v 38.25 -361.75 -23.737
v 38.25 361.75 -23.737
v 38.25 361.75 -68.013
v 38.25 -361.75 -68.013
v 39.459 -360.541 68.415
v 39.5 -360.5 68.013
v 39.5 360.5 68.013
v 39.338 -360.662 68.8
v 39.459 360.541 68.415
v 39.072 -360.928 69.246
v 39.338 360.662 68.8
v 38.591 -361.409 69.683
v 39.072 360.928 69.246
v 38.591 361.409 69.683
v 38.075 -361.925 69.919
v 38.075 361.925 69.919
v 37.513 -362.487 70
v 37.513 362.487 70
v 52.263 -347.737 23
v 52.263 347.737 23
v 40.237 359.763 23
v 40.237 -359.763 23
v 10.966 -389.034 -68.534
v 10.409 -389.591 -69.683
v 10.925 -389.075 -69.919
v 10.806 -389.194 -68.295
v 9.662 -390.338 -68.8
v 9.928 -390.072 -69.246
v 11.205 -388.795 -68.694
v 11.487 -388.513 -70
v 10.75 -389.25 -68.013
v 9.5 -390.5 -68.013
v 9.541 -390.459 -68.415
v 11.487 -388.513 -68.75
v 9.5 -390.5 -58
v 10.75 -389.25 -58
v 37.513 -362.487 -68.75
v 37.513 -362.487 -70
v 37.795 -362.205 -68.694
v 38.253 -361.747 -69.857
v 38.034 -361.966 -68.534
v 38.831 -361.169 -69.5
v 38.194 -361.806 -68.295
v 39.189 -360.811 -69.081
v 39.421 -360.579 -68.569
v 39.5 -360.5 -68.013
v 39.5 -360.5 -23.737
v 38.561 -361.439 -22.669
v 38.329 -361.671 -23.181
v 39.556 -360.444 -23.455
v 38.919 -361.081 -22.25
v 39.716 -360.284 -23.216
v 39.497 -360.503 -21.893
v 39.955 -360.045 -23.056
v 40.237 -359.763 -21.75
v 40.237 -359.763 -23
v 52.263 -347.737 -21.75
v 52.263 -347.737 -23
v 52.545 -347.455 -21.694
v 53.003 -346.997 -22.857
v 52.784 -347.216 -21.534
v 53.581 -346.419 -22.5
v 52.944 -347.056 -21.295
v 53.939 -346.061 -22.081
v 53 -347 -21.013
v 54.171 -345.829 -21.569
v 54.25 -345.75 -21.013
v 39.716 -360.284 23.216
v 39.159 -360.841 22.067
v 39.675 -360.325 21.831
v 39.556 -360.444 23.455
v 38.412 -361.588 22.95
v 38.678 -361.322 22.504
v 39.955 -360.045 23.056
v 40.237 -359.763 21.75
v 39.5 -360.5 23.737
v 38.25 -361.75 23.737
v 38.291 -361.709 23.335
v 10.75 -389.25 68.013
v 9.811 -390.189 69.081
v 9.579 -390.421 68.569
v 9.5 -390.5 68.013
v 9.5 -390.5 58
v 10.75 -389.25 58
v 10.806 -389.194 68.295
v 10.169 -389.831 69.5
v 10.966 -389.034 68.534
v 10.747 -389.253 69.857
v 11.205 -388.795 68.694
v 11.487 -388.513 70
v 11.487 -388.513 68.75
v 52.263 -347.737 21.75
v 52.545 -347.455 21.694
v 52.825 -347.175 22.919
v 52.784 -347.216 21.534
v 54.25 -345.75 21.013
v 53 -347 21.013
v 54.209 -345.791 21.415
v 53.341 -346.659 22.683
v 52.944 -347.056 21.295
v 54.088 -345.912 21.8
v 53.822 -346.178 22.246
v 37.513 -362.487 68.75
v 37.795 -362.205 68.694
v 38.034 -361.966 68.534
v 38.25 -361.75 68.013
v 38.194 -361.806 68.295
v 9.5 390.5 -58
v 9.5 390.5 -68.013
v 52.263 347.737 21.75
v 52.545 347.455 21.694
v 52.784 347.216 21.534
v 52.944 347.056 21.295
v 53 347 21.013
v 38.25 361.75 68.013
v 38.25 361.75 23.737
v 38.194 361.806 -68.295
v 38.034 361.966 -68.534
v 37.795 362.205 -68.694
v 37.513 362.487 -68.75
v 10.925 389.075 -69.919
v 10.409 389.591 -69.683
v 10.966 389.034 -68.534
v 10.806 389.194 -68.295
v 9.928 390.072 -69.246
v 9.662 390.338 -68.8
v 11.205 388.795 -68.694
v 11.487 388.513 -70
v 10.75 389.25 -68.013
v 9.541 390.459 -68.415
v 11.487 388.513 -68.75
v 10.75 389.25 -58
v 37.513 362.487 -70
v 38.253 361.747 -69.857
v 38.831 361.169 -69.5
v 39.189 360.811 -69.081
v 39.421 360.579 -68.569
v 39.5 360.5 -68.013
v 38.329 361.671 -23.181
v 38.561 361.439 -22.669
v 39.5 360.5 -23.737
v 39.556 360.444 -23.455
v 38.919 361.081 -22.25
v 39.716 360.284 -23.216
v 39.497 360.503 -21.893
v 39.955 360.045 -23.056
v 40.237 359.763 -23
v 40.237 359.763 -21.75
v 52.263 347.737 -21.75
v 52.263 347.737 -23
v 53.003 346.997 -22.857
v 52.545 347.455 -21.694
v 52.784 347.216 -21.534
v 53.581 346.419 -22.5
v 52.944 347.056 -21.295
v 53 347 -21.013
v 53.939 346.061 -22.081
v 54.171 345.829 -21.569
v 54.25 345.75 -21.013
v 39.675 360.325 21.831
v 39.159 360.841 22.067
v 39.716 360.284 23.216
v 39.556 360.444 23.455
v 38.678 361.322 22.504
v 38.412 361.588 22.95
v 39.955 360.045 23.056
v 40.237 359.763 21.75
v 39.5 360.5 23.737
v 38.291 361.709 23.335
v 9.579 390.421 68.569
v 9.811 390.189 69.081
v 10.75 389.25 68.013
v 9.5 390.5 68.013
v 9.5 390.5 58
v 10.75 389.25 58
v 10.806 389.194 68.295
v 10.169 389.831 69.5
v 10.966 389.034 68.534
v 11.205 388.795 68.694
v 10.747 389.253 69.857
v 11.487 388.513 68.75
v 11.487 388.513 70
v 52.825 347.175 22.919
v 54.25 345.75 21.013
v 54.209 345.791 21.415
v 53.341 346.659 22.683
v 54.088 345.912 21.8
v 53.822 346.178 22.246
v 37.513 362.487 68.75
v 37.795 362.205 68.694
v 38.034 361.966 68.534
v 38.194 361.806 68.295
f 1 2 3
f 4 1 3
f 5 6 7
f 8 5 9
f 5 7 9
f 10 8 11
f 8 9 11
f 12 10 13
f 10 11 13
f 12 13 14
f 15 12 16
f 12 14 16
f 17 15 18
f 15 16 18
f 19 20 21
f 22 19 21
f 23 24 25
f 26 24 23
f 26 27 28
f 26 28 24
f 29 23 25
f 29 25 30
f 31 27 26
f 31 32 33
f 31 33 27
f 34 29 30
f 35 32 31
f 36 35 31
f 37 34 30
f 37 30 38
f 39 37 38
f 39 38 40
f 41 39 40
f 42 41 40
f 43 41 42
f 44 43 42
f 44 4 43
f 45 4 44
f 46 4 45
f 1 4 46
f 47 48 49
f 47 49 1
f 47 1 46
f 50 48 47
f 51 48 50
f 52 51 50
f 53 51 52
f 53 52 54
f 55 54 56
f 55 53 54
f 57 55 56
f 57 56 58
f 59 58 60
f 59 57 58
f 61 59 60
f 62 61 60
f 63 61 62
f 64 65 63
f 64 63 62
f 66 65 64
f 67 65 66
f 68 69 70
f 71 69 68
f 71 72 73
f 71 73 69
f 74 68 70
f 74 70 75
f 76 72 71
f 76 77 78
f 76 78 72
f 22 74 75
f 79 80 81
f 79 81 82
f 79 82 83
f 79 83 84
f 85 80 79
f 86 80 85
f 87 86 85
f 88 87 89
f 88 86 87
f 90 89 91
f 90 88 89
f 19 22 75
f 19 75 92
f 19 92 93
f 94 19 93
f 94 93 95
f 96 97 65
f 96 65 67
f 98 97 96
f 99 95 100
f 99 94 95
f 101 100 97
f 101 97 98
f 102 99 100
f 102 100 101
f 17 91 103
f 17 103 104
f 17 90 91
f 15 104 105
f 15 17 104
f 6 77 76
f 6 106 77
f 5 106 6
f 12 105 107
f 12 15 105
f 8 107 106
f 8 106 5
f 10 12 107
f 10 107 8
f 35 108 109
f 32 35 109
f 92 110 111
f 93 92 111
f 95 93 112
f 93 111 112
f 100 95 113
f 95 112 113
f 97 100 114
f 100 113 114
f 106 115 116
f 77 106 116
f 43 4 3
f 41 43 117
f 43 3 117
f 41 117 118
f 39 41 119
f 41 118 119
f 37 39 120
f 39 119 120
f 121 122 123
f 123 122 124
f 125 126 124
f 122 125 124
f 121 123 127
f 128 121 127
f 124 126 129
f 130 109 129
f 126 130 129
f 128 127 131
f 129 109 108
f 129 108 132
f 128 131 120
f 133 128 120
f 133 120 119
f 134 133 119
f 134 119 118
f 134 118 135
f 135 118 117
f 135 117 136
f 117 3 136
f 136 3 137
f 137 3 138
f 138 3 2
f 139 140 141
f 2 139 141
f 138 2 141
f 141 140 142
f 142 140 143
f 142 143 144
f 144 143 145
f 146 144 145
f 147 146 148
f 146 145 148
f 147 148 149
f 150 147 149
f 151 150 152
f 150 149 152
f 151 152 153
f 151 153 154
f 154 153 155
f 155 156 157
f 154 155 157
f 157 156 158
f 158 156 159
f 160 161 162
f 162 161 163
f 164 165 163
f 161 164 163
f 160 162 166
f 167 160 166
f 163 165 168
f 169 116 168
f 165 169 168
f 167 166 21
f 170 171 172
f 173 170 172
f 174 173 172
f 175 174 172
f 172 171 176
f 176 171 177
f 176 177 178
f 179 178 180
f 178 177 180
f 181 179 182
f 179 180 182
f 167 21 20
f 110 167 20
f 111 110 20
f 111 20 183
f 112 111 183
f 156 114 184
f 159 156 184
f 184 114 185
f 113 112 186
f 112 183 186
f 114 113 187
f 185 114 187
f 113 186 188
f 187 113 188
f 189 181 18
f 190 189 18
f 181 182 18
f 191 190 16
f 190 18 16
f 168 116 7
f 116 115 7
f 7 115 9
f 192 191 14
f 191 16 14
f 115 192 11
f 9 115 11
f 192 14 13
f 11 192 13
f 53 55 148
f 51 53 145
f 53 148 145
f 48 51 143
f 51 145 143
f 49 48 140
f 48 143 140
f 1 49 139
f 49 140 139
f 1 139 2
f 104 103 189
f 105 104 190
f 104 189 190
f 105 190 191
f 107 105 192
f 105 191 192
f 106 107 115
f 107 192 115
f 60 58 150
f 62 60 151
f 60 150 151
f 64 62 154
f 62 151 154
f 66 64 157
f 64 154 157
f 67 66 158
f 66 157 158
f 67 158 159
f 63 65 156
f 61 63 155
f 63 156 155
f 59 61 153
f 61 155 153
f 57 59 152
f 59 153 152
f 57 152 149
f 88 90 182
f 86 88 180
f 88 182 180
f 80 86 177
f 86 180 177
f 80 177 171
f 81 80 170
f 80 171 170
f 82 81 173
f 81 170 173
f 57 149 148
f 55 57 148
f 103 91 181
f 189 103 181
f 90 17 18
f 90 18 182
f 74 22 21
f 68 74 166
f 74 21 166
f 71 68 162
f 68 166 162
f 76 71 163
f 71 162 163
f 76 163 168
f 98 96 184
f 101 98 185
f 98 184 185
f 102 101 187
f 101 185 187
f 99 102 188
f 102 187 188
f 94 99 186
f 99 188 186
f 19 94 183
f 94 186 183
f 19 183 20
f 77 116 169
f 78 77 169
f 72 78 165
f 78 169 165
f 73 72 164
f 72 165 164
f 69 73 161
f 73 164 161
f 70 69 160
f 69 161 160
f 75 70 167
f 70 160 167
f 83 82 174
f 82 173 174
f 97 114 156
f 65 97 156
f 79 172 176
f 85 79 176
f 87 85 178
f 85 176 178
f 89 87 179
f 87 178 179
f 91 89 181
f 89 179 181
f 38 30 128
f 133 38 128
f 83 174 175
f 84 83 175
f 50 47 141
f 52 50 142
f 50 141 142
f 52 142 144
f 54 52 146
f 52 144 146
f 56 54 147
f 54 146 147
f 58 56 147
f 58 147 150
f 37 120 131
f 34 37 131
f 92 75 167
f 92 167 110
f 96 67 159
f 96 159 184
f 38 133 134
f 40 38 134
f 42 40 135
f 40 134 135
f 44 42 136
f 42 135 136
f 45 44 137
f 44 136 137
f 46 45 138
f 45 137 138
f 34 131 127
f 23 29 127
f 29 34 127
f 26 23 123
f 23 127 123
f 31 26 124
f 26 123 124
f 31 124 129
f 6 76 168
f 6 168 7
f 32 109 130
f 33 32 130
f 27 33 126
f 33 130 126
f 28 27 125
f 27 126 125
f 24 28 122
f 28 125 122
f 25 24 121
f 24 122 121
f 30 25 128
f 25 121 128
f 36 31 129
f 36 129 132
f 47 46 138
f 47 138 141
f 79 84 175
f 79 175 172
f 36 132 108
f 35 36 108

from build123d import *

# Parameters (mm, degrees)
BASE_FLANGE1_DEPTH = 390.5
CUT_EXTRUDE2_DEPTH = 419.369827425


# Sheet-metal steps are written as plain solids
with BuildPart() as part:
    # Sketch1 → Base-Flange1 (new, symmetric)
    with BuildSketch(Plane(origin=(0, 0, 0), x_dir=(1, 0, 0), z_dir=(0, 1, 0))):
        with BuildLine():
            Line((9.5, 58), (9.5, 68.0134))
            ThreePointArc((9.5, 68.0134), (10.081861668, 69.418138332), (11.4866, 70))
            Line((11.4866, 70), (37.5134, 70))
            ThreePointArc((37.5134, 70), (38.918138332, 69.418138332), (39.5, 68.0134))
            Line((39.5, 68.0134), (39.5, 23.7366))
            ThreePointArc((39.5, 23.7366), (39.715745145, 23.215745145), (40.2366, 23))
            Line((40.2366, 23), (52.2634, 23))
            ThreePointArc((52.2634, 23), (53.668138332, 22.418138332), (54.25, 21.0134))
            Line((54.25, 21.0134), (54.25, 18))
            Line((54.25, 18), (54.25, -21.0134))
            ThreePointArc((54.25, -21.0134), (53.668138332, -22.418138332), (52.2634, -23))
            Line((52.2634, -23), (40.2366, -23))
            ThreePointArc((40.2366, -23), (39.715745145, -23.215745145), (39.5, -23.7366))
            Line((39.5, -23.7366), (39.5, -68.0134))
            ThreePointArc((39.5, -68.0134), (38.918138332, -69.418138332), (37.5134, -70))
            Line((37.5134, -70), (11.4866, -70))
            ThreePointArc((11.4866, -70), (10.081861668, -69.418138332), (9.5, -68.0134))
            Line((9.5, -68.0134), (9.5, -58))
            Line((9.5, -58), (10.75, -58))
            Line((10.75, -58), (10.75, -68.0134))
            ThreePointArc((10.75, -68.0134), (10.965745145, -68.534254855), (11.4866, -68.75))
            Line((11.4866, -68.75), (37.5134, -68.75))
            ThreePointArc((37.5134, -68.75), (38.034254855, -68.534254855), (38.25, -68.0134))
            Line((38.25, -68.0134), (38.25, -23.7366))
            ThreePointArc((38.25, -23.7366), (38.831861668, -22.331861668), (40.2366, -21.75))
            Line((40.2366, -21.75), (52.2634, -21.75))
            ThreePointArc((52.2634, -21.75), (52.784254855, -21.534254855), (53, -21.0134))
            Line((53, -21.0134), (53, 18))
            Line((53, 18), (53, 21.0134))
            ThreePointArc((53, 21.0134), (52.784254855, 21.534254855), (52.2634, 21.75))
            Line((52.2634, 21.75), (40.2366, 21.75))
            ThreePointArc((40.2366, 21.75), (38.831861668, 22.331861668), (38.25, 23.7366))
            Line((38.25, 23.7366), (38.25, 68.0134))
            ThreePointArc((38.25, 68.0134), (38.034254855, 68.534254855), (37.5134, 68.75))
            Line((37.5134, 68.75), (11.4866, 68.75))
            ThreePointArc((11.4866, 68.75), (10.965745145, 68.534254855), (10.75, 68.0134))
            Line((10.75, 68.0134), (10.75, 58))
            Line((10.75, 58), (9.5, 58))
        make_face()
    extrude(amount=BASE_FLANGE1_DEPTH, both=True)

    # Sketch2 → Cut-Extrude2 (cut, through all)
    with BuildSketch(Plane.XY.offset(70)):
        Polygon((9.5, -390.5), (204.29871247, -195.70128753), (123.087268974, -390.5), align=None)
        Polygon((123.087268974, 390.5), (9.5, 390.5), (204.29871247, 195.70128753), align=None)
    extrude(amount=-CUT_EXTRUDE2_DEPTH, mode=Mode.SUBTRACT)


solid = part.part
